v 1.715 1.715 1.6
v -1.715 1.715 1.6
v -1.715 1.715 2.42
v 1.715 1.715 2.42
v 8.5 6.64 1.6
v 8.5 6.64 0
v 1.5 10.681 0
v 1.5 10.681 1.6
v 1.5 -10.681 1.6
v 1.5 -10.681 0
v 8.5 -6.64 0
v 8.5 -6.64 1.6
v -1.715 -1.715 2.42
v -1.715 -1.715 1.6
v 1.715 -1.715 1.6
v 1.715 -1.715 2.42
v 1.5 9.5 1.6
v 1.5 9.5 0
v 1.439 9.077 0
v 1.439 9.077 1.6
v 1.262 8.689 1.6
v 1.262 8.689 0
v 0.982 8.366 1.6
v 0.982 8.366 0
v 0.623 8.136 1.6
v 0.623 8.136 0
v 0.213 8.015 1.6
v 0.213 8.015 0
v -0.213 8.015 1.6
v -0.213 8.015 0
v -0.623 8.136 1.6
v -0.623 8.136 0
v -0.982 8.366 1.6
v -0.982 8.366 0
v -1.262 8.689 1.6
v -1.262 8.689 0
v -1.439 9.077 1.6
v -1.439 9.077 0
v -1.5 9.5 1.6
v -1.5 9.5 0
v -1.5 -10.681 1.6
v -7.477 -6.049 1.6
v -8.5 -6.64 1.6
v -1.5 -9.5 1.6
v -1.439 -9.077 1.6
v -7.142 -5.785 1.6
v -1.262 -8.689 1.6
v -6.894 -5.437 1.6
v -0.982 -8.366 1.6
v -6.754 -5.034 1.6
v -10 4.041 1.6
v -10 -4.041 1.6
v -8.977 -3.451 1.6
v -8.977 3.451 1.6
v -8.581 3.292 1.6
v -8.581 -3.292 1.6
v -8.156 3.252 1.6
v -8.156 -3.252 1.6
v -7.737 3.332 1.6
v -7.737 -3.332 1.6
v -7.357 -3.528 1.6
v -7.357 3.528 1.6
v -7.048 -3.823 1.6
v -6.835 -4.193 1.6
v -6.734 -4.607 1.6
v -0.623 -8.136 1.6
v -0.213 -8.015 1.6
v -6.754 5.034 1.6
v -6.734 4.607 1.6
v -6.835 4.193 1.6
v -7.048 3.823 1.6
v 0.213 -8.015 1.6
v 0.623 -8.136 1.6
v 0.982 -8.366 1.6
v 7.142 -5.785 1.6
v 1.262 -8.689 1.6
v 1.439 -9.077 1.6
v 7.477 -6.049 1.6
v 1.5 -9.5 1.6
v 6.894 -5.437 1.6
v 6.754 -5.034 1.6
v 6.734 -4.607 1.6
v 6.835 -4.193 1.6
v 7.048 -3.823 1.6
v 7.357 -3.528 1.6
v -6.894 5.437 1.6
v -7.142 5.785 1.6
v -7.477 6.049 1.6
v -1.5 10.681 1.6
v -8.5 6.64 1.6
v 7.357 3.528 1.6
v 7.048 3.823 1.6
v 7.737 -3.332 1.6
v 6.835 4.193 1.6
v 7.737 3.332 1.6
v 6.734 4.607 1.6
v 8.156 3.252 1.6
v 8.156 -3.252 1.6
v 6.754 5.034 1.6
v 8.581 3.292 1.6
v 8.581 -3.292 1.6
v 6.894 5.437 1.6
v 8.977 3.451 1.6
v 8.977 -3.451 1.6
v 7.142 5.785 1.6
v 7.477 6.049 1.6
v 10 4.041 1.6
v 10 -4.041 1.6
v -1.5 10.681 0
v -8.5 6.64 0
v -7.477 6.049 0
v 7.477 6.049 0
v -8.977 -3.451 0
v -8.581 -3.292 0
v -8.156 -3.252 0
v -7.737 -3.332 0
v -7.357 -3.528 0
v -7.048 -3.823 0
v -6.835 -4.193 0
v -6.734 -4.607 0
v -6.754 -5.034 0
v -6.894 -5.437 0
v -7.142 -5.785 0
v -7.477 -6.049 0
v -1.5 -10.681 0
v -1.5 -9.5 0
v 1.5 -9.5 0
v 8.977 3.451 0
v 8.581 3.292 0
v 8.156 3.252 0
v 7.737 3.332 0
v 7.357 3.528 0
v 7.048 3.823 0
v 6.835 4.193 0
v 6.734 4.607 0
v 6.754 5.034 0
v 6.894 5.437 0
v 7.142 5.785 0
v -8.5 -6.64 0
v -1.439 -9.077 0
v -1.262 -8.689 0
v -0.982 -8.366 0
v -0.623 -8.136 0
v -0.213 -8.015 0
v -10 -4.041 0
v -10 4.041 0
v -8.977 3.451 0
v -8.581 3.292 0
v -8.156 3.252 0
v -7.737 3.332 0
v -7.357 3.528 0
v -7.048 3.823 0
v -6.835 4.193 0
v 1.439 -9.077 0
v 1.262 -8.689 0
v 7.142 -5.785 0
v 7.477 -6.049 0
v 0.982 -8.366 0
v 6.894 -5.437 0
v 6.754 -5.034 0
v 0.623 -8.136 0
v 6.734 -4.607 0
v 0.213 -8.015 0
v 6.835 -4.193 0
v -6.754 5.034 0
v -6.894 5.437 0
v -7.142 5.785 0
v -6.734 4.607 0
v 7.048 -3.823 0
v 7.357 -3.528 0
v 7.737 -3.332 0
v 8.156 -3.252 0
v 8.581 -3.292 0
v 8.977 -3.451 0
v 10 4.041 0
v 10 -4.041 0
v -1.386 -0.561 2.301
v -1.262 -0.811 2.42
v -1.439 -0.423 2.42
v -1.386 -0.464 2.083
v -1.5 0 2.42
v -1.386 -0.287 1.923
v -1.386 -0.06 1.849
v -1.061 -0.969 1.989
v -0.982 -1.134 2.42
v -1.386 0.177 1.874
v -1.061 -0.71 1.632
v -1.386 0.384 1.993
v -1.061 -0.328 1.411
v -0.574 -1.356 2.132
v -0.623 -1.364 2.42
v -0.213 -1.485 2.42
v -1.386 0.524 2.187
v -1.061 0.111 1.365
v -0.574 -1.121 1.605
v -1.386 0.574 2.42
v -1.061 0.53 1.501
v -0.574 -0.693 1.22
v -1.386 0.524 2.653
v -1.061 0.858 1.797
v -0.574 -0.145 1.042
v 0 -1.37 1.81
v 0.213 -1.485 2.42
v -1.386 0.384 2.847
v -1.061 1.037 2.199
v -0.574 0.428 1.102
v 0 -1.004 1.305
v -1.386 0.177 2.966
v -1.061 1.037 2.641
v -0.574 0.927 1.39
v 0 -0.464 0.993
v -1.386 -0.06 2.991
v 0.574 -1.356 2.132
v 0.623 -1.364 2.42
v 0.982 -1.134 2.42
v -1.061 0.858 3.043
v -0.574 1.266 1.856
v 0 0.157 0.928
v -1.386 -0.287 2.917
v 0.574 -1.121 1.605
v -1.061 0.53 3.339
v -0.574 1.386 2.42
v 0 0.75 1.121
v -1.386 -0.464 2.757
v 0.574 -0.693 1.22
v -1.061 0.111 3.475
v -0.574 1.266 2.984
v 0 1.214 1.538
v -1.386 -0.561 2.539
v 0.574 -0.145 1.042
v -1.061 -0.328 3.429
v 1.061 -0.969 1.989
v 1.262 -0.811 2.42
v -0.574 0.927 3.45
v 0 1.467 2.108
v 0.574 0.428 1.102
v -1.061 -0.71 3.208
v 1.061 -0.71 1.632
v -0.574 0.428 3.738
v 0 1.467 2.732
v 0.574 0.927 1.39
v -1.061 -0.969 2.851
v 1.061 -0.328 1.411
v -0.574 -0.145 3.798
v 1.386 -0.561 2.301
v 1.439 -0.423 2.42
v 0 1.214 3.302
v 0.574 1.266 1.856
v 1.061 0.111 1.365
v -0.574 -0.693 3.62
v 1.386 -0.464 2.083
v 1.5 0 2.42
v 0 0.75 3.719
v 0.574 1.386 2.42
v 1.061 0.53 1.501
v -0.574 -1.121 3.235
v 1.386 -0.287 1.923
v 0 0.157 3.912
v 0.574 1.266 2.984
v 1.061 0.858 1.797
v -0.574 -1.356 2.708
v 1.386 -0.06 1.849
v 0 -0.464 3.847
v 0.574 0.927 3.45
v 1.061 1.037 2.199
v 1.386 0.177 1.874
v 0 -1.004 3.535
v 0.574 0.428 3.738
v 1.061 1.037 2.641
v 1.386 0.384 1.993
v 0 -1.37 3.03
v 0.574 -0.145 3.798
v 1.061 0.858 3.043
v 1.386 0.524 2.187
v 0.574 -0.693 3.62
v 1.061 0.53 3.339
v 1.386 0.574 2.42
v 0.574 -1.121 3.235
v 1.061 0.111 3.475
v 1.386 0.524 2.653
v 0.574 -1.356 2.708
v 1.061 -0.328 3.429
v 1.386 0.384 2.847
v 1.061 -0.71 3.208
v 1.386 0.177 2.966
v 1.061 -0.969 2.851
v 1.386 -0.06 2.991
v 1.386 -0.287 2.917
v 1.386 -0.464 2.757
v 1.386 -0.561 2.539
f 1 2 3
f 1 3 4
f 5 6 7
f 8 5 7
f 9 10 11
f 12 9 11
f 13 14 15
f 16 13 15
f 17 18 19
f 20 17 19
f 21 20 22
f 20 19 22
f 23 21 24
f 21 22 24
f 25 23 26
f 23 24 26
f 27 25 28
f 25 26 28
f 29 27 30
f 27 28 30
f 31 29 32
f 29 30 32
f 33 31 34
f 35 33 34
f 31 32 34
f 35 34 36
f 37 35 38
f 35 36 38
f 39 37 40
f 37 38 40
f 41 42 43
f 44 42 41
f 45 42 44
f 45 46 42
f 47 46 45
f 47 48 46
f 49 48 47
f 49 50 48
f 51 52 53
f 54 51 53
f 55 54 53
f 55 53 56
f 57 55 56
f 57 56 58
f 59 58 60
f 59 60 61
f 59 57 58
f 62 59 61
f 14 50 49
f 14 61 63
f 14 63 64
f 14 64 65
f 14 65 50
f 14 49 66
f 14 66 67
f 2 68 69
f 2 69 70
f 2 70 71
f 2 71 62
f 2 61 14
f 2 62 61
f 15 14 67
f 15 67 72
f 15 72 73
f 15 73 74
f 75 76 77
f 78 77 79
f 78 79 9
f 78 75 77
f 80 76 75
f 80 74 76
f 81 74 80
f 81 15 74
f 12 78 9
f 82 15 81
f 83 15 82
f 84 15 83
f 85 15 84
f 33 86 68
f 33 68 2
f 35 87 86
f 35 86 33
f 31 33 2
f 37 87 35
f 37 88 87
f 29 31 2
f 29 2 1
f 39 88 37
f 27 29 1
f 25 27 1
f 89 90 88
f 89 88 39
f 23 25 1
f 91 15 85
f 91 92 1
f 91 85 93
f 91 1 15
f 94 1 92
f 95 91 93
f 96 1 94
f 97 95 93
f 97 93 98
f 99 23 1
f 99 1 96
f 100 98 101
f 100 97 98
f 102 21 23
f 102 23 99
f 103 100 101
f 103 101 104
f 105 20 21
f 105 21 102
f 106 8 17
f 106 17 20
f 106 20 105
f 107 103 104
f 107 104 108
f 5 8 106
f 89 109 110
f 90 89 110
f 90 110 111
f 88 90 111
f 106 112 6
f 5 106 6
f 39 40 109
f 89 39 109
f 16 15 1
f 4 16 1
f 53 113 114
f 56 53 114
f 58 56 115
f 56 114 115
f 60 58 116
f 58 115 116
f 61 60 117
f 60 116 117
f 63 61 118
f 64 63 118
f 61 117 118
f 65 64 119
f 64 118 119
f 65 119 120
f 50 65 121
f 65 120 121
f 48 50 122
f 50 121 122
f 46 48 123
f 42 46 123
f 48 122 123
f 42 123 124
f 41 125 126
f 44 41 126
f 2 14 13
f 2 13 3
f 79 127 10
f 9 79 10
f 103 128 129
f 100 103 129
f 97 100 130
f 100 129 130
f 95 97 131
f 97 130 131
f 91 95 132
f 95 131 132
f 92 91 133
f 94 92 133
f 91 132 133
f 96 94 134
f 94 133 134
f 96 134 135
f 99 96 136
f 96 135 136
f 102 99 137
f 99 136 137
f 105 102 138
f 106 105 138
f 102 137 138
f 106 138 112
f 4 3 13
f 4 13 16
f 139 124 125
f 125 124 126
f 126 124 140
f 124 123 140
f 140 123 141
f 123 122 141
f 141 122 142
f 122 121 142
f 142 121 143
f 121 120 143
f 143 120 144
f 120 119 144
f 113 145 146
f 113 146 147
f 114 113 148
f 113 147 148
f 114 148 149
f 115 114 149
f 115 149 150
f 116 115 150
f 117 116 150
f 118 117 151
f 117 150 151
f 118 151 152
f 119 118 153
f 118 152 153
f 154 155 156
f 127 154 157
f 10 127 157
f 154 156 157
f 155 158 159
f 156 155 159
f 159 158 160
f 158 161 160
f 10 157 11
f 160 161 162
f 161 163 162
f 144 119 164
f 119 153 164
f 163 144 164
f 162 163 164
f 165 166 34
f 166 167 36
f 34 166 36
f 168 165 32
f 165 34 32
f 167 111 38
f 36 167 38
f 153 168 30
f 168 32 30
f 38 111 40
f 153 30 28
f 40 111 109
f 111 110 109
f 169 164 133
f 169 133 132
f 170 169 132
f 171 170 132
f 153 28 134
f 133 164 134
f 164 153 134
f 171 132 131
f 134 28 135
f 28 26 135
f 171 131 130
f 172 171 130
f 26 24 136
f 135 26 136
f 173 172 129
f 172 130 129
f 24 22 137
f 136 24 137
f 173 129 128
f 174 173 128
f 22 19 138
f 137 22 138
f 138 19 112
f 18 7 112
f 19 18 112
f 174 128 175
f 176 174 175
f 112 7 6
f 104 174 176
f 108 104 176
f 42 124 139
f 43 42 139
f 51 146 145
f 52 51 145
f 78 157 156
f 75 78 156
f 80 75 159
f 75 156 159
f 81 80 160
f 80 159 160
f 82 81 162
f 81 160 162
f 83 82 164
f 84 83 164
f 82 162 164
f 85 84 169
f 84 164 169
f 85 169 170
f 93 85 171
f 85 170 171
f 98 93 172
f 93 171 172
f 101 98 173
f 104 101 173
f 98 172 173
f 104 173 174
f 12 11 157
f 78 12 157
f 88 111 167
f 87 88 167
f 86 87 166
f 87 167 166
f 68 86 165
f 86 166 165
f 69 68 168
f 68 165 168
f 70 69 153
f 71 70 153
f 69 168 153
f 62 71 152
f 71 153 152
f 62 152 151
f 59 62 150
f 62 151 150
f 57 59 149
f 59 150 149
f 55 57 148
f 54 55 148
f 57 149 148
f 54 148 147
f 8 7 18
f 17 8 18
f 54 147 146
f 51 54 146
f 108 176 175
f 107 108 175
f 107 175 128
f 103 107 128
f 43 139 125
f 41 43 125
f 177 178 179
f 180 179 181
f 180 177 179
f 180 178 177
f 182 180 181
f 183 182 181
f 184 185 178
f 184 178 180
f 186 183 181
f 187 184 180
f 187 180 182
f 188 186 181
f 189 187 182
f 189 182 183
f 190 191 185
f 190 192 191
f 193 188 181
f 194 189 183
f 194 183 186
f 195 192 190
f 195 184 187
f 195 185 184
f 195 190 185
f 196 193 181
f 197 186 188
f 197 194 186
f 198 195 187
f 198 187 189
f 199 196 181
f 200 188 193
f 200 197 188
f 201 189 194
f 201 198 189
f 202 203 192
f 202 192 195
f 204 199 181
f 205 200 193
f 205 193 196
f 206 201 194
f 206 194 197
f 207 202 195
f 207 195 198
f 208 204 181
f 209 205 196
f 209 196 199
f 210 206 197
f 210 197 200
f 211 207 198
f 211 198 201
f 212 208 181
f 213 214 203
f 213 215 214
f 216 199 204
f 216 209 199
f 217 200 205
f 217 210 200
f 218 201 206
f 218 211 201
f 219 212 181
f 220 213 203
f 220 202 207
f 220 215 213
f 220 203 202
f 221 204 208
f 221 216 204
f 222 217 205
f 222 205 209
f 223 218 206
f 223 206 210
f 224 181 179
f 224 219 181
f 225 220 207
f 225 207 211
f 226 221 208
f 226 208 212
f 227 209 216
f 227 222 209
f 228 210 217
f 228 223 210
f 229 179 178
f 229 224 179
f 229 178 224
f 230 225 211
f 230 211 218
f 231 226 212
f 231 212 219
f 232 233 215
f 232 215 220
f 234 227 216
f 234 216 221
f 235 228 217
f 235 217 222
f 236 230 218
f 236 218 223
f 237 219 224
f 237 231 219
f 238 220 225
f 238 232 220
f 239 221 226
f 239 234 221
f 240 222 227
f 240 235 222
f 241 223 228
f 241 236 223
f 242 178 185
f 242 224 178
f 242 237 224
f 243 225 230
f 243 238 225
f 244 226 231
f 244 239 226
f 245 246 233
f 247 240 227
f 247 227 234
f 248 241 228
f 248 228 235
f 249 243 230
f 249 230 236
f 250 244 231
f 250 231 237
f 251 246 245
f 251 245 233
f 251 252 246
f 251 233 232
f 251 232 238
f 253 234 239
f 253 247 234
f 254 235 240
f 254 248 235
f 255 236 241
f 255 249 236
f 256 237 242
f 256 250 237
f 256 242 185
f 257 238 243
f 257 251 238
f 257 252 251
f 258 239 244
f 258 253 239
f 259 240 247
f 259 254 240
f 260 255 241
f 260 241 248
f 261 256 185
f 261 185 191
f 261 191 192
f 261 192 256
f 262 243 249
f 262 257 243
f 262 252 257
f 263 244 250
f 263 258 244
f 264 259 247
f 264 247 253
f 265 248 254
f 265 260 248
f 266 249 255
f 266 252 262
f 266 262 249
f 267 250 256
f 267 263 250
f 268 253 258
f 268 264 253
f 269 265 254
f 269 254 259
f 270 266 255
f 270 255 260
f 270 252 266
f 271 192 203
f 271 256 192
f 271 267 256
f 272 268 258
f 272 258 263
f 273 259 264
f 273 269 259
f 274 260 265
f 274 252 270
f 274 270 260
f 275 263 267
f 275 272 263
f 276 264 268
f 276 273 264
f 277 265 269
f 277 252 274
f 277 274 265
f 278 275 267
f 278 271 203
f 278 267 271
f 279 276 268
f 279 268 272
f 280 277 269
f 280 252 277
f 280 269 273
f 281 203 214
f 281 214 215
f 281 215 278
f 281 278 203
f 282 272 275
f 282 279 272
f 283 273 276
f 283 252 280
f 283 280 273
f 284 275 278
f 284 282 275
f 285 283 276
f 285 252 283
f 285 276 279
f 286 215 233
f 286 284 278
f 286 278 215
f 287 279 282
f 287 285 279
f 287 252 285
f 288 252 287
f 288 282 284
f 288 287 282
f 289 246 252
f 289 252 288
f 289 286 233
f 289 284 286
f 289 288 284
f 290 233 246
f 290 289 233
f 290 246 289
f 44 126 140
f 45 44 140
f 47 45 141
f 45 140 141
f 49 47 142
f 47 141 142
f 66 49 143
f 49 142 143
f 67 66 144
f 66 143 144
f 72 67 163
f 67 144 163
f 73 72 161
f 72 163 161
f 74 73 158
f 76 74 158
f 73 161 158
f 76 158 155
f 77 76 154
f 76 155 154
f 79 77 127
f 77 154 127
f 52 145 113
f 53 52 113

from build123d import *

# Parameters (mm, degrees)
F0_W     = 3.43
F0_H     = 3.43
F1_DEPTH = 1.6
F0_R     = 1.5
F2_DEPTH = 2.42


with BuildPart() as f1:
    # F0 (on Top) → F1 (new body)
    with BuildSketch(Plane.XY):
        with BuildLine():
            Line((10, -4.041452), (10, 4.041452))
            Line((10, 4.041452), (8.977241, 3.450962))
            ThreePointArc((8.977241, 3.450962), (6.928203, 4), (7.477241, 6.049038))
            Line((7.477241, 6.049038), (8.5, 6.639528))
            Line((8.5, 6.639528), (1.5, 10.68098))
            Line((1.5, 10.68098), (1.5, 9.5))
            ThreePointArc((1.5, 9.5), (0, 8), (-1.5, 9.5))
            Line((-1.5, 9.5), (-1.5, 10.68098))
            Line((-1.5, 10.68098), (-8.5, 6.639528))
            Line((-8.5, 6.639528), (-7.477241, 6.049038))
            ThreePointArc((-7.477241, 6.049038), (-6.928203, 4), (-8.977241, 3.450962))
            Line((-8.977241, 3.450962), (-10, 4.041452))
            Line((-10, 4.041452), (-10, -4.041452))
            Line((-10, -4.041452), (-8.977241, -3.450962))
            ThreePointArc((-8.977241, -3.450962), (-6.928203, -4), (-7.477241, -6.049038))
            Line((-7.477241, -6.049038), (-8.5, -6.639528))
            Line((-8.5, -6.639528), (-1.5, -10.68098))
            Line((-1.5, -10.68098), (-1.5, -9.5))
            ThreePointArc((-1.5, -9.5), (0, -8), (1.5, -9.5))
            Line((1.5, -9.5), (1.5, -10.68098))
            Line((1.5, -10.68098), (8.5, -6.639528))
            Line((8.5, -6.639528), (7.477241, -6.049038))
            ThreePointArc((7.477241, -6.049038), (6.928203, -4), (8.977241, -3.450962))
            Line((8.977241, -3.450962), (10, -4.041452))
        make_face()
        Rectangle(F0_W, F0_H, mode=Mode.SUBTRACT)
    extrude(amount=F1_DEPTH)

    # F0 (on Top) → F2 (join)
    with BuildSketch(Plane.XY):
        Rectangle(F0_W, F0_H)
        Circle(F0_R, mode=Mode.SUBTRACT)
        Circle(F0_R)
    extrude(amount=F2_DEPTH)


with BuildPart() as f4:
    # F3 (on face) → F4 (revolve)
    with BuildSketch(Plane.XY.offset(2.42)):
        with BuildLine():
            Line((1.5, 0), (-1.5, 0))
            ThreePointArc((-1.5, 0), (0, -1.5), (1.5, 0))
        make_face()
    revolve(axis=Axis((0, 0, 2.42), (1, 0, 0)))


solid = Compound([f1.part, f4.part])
